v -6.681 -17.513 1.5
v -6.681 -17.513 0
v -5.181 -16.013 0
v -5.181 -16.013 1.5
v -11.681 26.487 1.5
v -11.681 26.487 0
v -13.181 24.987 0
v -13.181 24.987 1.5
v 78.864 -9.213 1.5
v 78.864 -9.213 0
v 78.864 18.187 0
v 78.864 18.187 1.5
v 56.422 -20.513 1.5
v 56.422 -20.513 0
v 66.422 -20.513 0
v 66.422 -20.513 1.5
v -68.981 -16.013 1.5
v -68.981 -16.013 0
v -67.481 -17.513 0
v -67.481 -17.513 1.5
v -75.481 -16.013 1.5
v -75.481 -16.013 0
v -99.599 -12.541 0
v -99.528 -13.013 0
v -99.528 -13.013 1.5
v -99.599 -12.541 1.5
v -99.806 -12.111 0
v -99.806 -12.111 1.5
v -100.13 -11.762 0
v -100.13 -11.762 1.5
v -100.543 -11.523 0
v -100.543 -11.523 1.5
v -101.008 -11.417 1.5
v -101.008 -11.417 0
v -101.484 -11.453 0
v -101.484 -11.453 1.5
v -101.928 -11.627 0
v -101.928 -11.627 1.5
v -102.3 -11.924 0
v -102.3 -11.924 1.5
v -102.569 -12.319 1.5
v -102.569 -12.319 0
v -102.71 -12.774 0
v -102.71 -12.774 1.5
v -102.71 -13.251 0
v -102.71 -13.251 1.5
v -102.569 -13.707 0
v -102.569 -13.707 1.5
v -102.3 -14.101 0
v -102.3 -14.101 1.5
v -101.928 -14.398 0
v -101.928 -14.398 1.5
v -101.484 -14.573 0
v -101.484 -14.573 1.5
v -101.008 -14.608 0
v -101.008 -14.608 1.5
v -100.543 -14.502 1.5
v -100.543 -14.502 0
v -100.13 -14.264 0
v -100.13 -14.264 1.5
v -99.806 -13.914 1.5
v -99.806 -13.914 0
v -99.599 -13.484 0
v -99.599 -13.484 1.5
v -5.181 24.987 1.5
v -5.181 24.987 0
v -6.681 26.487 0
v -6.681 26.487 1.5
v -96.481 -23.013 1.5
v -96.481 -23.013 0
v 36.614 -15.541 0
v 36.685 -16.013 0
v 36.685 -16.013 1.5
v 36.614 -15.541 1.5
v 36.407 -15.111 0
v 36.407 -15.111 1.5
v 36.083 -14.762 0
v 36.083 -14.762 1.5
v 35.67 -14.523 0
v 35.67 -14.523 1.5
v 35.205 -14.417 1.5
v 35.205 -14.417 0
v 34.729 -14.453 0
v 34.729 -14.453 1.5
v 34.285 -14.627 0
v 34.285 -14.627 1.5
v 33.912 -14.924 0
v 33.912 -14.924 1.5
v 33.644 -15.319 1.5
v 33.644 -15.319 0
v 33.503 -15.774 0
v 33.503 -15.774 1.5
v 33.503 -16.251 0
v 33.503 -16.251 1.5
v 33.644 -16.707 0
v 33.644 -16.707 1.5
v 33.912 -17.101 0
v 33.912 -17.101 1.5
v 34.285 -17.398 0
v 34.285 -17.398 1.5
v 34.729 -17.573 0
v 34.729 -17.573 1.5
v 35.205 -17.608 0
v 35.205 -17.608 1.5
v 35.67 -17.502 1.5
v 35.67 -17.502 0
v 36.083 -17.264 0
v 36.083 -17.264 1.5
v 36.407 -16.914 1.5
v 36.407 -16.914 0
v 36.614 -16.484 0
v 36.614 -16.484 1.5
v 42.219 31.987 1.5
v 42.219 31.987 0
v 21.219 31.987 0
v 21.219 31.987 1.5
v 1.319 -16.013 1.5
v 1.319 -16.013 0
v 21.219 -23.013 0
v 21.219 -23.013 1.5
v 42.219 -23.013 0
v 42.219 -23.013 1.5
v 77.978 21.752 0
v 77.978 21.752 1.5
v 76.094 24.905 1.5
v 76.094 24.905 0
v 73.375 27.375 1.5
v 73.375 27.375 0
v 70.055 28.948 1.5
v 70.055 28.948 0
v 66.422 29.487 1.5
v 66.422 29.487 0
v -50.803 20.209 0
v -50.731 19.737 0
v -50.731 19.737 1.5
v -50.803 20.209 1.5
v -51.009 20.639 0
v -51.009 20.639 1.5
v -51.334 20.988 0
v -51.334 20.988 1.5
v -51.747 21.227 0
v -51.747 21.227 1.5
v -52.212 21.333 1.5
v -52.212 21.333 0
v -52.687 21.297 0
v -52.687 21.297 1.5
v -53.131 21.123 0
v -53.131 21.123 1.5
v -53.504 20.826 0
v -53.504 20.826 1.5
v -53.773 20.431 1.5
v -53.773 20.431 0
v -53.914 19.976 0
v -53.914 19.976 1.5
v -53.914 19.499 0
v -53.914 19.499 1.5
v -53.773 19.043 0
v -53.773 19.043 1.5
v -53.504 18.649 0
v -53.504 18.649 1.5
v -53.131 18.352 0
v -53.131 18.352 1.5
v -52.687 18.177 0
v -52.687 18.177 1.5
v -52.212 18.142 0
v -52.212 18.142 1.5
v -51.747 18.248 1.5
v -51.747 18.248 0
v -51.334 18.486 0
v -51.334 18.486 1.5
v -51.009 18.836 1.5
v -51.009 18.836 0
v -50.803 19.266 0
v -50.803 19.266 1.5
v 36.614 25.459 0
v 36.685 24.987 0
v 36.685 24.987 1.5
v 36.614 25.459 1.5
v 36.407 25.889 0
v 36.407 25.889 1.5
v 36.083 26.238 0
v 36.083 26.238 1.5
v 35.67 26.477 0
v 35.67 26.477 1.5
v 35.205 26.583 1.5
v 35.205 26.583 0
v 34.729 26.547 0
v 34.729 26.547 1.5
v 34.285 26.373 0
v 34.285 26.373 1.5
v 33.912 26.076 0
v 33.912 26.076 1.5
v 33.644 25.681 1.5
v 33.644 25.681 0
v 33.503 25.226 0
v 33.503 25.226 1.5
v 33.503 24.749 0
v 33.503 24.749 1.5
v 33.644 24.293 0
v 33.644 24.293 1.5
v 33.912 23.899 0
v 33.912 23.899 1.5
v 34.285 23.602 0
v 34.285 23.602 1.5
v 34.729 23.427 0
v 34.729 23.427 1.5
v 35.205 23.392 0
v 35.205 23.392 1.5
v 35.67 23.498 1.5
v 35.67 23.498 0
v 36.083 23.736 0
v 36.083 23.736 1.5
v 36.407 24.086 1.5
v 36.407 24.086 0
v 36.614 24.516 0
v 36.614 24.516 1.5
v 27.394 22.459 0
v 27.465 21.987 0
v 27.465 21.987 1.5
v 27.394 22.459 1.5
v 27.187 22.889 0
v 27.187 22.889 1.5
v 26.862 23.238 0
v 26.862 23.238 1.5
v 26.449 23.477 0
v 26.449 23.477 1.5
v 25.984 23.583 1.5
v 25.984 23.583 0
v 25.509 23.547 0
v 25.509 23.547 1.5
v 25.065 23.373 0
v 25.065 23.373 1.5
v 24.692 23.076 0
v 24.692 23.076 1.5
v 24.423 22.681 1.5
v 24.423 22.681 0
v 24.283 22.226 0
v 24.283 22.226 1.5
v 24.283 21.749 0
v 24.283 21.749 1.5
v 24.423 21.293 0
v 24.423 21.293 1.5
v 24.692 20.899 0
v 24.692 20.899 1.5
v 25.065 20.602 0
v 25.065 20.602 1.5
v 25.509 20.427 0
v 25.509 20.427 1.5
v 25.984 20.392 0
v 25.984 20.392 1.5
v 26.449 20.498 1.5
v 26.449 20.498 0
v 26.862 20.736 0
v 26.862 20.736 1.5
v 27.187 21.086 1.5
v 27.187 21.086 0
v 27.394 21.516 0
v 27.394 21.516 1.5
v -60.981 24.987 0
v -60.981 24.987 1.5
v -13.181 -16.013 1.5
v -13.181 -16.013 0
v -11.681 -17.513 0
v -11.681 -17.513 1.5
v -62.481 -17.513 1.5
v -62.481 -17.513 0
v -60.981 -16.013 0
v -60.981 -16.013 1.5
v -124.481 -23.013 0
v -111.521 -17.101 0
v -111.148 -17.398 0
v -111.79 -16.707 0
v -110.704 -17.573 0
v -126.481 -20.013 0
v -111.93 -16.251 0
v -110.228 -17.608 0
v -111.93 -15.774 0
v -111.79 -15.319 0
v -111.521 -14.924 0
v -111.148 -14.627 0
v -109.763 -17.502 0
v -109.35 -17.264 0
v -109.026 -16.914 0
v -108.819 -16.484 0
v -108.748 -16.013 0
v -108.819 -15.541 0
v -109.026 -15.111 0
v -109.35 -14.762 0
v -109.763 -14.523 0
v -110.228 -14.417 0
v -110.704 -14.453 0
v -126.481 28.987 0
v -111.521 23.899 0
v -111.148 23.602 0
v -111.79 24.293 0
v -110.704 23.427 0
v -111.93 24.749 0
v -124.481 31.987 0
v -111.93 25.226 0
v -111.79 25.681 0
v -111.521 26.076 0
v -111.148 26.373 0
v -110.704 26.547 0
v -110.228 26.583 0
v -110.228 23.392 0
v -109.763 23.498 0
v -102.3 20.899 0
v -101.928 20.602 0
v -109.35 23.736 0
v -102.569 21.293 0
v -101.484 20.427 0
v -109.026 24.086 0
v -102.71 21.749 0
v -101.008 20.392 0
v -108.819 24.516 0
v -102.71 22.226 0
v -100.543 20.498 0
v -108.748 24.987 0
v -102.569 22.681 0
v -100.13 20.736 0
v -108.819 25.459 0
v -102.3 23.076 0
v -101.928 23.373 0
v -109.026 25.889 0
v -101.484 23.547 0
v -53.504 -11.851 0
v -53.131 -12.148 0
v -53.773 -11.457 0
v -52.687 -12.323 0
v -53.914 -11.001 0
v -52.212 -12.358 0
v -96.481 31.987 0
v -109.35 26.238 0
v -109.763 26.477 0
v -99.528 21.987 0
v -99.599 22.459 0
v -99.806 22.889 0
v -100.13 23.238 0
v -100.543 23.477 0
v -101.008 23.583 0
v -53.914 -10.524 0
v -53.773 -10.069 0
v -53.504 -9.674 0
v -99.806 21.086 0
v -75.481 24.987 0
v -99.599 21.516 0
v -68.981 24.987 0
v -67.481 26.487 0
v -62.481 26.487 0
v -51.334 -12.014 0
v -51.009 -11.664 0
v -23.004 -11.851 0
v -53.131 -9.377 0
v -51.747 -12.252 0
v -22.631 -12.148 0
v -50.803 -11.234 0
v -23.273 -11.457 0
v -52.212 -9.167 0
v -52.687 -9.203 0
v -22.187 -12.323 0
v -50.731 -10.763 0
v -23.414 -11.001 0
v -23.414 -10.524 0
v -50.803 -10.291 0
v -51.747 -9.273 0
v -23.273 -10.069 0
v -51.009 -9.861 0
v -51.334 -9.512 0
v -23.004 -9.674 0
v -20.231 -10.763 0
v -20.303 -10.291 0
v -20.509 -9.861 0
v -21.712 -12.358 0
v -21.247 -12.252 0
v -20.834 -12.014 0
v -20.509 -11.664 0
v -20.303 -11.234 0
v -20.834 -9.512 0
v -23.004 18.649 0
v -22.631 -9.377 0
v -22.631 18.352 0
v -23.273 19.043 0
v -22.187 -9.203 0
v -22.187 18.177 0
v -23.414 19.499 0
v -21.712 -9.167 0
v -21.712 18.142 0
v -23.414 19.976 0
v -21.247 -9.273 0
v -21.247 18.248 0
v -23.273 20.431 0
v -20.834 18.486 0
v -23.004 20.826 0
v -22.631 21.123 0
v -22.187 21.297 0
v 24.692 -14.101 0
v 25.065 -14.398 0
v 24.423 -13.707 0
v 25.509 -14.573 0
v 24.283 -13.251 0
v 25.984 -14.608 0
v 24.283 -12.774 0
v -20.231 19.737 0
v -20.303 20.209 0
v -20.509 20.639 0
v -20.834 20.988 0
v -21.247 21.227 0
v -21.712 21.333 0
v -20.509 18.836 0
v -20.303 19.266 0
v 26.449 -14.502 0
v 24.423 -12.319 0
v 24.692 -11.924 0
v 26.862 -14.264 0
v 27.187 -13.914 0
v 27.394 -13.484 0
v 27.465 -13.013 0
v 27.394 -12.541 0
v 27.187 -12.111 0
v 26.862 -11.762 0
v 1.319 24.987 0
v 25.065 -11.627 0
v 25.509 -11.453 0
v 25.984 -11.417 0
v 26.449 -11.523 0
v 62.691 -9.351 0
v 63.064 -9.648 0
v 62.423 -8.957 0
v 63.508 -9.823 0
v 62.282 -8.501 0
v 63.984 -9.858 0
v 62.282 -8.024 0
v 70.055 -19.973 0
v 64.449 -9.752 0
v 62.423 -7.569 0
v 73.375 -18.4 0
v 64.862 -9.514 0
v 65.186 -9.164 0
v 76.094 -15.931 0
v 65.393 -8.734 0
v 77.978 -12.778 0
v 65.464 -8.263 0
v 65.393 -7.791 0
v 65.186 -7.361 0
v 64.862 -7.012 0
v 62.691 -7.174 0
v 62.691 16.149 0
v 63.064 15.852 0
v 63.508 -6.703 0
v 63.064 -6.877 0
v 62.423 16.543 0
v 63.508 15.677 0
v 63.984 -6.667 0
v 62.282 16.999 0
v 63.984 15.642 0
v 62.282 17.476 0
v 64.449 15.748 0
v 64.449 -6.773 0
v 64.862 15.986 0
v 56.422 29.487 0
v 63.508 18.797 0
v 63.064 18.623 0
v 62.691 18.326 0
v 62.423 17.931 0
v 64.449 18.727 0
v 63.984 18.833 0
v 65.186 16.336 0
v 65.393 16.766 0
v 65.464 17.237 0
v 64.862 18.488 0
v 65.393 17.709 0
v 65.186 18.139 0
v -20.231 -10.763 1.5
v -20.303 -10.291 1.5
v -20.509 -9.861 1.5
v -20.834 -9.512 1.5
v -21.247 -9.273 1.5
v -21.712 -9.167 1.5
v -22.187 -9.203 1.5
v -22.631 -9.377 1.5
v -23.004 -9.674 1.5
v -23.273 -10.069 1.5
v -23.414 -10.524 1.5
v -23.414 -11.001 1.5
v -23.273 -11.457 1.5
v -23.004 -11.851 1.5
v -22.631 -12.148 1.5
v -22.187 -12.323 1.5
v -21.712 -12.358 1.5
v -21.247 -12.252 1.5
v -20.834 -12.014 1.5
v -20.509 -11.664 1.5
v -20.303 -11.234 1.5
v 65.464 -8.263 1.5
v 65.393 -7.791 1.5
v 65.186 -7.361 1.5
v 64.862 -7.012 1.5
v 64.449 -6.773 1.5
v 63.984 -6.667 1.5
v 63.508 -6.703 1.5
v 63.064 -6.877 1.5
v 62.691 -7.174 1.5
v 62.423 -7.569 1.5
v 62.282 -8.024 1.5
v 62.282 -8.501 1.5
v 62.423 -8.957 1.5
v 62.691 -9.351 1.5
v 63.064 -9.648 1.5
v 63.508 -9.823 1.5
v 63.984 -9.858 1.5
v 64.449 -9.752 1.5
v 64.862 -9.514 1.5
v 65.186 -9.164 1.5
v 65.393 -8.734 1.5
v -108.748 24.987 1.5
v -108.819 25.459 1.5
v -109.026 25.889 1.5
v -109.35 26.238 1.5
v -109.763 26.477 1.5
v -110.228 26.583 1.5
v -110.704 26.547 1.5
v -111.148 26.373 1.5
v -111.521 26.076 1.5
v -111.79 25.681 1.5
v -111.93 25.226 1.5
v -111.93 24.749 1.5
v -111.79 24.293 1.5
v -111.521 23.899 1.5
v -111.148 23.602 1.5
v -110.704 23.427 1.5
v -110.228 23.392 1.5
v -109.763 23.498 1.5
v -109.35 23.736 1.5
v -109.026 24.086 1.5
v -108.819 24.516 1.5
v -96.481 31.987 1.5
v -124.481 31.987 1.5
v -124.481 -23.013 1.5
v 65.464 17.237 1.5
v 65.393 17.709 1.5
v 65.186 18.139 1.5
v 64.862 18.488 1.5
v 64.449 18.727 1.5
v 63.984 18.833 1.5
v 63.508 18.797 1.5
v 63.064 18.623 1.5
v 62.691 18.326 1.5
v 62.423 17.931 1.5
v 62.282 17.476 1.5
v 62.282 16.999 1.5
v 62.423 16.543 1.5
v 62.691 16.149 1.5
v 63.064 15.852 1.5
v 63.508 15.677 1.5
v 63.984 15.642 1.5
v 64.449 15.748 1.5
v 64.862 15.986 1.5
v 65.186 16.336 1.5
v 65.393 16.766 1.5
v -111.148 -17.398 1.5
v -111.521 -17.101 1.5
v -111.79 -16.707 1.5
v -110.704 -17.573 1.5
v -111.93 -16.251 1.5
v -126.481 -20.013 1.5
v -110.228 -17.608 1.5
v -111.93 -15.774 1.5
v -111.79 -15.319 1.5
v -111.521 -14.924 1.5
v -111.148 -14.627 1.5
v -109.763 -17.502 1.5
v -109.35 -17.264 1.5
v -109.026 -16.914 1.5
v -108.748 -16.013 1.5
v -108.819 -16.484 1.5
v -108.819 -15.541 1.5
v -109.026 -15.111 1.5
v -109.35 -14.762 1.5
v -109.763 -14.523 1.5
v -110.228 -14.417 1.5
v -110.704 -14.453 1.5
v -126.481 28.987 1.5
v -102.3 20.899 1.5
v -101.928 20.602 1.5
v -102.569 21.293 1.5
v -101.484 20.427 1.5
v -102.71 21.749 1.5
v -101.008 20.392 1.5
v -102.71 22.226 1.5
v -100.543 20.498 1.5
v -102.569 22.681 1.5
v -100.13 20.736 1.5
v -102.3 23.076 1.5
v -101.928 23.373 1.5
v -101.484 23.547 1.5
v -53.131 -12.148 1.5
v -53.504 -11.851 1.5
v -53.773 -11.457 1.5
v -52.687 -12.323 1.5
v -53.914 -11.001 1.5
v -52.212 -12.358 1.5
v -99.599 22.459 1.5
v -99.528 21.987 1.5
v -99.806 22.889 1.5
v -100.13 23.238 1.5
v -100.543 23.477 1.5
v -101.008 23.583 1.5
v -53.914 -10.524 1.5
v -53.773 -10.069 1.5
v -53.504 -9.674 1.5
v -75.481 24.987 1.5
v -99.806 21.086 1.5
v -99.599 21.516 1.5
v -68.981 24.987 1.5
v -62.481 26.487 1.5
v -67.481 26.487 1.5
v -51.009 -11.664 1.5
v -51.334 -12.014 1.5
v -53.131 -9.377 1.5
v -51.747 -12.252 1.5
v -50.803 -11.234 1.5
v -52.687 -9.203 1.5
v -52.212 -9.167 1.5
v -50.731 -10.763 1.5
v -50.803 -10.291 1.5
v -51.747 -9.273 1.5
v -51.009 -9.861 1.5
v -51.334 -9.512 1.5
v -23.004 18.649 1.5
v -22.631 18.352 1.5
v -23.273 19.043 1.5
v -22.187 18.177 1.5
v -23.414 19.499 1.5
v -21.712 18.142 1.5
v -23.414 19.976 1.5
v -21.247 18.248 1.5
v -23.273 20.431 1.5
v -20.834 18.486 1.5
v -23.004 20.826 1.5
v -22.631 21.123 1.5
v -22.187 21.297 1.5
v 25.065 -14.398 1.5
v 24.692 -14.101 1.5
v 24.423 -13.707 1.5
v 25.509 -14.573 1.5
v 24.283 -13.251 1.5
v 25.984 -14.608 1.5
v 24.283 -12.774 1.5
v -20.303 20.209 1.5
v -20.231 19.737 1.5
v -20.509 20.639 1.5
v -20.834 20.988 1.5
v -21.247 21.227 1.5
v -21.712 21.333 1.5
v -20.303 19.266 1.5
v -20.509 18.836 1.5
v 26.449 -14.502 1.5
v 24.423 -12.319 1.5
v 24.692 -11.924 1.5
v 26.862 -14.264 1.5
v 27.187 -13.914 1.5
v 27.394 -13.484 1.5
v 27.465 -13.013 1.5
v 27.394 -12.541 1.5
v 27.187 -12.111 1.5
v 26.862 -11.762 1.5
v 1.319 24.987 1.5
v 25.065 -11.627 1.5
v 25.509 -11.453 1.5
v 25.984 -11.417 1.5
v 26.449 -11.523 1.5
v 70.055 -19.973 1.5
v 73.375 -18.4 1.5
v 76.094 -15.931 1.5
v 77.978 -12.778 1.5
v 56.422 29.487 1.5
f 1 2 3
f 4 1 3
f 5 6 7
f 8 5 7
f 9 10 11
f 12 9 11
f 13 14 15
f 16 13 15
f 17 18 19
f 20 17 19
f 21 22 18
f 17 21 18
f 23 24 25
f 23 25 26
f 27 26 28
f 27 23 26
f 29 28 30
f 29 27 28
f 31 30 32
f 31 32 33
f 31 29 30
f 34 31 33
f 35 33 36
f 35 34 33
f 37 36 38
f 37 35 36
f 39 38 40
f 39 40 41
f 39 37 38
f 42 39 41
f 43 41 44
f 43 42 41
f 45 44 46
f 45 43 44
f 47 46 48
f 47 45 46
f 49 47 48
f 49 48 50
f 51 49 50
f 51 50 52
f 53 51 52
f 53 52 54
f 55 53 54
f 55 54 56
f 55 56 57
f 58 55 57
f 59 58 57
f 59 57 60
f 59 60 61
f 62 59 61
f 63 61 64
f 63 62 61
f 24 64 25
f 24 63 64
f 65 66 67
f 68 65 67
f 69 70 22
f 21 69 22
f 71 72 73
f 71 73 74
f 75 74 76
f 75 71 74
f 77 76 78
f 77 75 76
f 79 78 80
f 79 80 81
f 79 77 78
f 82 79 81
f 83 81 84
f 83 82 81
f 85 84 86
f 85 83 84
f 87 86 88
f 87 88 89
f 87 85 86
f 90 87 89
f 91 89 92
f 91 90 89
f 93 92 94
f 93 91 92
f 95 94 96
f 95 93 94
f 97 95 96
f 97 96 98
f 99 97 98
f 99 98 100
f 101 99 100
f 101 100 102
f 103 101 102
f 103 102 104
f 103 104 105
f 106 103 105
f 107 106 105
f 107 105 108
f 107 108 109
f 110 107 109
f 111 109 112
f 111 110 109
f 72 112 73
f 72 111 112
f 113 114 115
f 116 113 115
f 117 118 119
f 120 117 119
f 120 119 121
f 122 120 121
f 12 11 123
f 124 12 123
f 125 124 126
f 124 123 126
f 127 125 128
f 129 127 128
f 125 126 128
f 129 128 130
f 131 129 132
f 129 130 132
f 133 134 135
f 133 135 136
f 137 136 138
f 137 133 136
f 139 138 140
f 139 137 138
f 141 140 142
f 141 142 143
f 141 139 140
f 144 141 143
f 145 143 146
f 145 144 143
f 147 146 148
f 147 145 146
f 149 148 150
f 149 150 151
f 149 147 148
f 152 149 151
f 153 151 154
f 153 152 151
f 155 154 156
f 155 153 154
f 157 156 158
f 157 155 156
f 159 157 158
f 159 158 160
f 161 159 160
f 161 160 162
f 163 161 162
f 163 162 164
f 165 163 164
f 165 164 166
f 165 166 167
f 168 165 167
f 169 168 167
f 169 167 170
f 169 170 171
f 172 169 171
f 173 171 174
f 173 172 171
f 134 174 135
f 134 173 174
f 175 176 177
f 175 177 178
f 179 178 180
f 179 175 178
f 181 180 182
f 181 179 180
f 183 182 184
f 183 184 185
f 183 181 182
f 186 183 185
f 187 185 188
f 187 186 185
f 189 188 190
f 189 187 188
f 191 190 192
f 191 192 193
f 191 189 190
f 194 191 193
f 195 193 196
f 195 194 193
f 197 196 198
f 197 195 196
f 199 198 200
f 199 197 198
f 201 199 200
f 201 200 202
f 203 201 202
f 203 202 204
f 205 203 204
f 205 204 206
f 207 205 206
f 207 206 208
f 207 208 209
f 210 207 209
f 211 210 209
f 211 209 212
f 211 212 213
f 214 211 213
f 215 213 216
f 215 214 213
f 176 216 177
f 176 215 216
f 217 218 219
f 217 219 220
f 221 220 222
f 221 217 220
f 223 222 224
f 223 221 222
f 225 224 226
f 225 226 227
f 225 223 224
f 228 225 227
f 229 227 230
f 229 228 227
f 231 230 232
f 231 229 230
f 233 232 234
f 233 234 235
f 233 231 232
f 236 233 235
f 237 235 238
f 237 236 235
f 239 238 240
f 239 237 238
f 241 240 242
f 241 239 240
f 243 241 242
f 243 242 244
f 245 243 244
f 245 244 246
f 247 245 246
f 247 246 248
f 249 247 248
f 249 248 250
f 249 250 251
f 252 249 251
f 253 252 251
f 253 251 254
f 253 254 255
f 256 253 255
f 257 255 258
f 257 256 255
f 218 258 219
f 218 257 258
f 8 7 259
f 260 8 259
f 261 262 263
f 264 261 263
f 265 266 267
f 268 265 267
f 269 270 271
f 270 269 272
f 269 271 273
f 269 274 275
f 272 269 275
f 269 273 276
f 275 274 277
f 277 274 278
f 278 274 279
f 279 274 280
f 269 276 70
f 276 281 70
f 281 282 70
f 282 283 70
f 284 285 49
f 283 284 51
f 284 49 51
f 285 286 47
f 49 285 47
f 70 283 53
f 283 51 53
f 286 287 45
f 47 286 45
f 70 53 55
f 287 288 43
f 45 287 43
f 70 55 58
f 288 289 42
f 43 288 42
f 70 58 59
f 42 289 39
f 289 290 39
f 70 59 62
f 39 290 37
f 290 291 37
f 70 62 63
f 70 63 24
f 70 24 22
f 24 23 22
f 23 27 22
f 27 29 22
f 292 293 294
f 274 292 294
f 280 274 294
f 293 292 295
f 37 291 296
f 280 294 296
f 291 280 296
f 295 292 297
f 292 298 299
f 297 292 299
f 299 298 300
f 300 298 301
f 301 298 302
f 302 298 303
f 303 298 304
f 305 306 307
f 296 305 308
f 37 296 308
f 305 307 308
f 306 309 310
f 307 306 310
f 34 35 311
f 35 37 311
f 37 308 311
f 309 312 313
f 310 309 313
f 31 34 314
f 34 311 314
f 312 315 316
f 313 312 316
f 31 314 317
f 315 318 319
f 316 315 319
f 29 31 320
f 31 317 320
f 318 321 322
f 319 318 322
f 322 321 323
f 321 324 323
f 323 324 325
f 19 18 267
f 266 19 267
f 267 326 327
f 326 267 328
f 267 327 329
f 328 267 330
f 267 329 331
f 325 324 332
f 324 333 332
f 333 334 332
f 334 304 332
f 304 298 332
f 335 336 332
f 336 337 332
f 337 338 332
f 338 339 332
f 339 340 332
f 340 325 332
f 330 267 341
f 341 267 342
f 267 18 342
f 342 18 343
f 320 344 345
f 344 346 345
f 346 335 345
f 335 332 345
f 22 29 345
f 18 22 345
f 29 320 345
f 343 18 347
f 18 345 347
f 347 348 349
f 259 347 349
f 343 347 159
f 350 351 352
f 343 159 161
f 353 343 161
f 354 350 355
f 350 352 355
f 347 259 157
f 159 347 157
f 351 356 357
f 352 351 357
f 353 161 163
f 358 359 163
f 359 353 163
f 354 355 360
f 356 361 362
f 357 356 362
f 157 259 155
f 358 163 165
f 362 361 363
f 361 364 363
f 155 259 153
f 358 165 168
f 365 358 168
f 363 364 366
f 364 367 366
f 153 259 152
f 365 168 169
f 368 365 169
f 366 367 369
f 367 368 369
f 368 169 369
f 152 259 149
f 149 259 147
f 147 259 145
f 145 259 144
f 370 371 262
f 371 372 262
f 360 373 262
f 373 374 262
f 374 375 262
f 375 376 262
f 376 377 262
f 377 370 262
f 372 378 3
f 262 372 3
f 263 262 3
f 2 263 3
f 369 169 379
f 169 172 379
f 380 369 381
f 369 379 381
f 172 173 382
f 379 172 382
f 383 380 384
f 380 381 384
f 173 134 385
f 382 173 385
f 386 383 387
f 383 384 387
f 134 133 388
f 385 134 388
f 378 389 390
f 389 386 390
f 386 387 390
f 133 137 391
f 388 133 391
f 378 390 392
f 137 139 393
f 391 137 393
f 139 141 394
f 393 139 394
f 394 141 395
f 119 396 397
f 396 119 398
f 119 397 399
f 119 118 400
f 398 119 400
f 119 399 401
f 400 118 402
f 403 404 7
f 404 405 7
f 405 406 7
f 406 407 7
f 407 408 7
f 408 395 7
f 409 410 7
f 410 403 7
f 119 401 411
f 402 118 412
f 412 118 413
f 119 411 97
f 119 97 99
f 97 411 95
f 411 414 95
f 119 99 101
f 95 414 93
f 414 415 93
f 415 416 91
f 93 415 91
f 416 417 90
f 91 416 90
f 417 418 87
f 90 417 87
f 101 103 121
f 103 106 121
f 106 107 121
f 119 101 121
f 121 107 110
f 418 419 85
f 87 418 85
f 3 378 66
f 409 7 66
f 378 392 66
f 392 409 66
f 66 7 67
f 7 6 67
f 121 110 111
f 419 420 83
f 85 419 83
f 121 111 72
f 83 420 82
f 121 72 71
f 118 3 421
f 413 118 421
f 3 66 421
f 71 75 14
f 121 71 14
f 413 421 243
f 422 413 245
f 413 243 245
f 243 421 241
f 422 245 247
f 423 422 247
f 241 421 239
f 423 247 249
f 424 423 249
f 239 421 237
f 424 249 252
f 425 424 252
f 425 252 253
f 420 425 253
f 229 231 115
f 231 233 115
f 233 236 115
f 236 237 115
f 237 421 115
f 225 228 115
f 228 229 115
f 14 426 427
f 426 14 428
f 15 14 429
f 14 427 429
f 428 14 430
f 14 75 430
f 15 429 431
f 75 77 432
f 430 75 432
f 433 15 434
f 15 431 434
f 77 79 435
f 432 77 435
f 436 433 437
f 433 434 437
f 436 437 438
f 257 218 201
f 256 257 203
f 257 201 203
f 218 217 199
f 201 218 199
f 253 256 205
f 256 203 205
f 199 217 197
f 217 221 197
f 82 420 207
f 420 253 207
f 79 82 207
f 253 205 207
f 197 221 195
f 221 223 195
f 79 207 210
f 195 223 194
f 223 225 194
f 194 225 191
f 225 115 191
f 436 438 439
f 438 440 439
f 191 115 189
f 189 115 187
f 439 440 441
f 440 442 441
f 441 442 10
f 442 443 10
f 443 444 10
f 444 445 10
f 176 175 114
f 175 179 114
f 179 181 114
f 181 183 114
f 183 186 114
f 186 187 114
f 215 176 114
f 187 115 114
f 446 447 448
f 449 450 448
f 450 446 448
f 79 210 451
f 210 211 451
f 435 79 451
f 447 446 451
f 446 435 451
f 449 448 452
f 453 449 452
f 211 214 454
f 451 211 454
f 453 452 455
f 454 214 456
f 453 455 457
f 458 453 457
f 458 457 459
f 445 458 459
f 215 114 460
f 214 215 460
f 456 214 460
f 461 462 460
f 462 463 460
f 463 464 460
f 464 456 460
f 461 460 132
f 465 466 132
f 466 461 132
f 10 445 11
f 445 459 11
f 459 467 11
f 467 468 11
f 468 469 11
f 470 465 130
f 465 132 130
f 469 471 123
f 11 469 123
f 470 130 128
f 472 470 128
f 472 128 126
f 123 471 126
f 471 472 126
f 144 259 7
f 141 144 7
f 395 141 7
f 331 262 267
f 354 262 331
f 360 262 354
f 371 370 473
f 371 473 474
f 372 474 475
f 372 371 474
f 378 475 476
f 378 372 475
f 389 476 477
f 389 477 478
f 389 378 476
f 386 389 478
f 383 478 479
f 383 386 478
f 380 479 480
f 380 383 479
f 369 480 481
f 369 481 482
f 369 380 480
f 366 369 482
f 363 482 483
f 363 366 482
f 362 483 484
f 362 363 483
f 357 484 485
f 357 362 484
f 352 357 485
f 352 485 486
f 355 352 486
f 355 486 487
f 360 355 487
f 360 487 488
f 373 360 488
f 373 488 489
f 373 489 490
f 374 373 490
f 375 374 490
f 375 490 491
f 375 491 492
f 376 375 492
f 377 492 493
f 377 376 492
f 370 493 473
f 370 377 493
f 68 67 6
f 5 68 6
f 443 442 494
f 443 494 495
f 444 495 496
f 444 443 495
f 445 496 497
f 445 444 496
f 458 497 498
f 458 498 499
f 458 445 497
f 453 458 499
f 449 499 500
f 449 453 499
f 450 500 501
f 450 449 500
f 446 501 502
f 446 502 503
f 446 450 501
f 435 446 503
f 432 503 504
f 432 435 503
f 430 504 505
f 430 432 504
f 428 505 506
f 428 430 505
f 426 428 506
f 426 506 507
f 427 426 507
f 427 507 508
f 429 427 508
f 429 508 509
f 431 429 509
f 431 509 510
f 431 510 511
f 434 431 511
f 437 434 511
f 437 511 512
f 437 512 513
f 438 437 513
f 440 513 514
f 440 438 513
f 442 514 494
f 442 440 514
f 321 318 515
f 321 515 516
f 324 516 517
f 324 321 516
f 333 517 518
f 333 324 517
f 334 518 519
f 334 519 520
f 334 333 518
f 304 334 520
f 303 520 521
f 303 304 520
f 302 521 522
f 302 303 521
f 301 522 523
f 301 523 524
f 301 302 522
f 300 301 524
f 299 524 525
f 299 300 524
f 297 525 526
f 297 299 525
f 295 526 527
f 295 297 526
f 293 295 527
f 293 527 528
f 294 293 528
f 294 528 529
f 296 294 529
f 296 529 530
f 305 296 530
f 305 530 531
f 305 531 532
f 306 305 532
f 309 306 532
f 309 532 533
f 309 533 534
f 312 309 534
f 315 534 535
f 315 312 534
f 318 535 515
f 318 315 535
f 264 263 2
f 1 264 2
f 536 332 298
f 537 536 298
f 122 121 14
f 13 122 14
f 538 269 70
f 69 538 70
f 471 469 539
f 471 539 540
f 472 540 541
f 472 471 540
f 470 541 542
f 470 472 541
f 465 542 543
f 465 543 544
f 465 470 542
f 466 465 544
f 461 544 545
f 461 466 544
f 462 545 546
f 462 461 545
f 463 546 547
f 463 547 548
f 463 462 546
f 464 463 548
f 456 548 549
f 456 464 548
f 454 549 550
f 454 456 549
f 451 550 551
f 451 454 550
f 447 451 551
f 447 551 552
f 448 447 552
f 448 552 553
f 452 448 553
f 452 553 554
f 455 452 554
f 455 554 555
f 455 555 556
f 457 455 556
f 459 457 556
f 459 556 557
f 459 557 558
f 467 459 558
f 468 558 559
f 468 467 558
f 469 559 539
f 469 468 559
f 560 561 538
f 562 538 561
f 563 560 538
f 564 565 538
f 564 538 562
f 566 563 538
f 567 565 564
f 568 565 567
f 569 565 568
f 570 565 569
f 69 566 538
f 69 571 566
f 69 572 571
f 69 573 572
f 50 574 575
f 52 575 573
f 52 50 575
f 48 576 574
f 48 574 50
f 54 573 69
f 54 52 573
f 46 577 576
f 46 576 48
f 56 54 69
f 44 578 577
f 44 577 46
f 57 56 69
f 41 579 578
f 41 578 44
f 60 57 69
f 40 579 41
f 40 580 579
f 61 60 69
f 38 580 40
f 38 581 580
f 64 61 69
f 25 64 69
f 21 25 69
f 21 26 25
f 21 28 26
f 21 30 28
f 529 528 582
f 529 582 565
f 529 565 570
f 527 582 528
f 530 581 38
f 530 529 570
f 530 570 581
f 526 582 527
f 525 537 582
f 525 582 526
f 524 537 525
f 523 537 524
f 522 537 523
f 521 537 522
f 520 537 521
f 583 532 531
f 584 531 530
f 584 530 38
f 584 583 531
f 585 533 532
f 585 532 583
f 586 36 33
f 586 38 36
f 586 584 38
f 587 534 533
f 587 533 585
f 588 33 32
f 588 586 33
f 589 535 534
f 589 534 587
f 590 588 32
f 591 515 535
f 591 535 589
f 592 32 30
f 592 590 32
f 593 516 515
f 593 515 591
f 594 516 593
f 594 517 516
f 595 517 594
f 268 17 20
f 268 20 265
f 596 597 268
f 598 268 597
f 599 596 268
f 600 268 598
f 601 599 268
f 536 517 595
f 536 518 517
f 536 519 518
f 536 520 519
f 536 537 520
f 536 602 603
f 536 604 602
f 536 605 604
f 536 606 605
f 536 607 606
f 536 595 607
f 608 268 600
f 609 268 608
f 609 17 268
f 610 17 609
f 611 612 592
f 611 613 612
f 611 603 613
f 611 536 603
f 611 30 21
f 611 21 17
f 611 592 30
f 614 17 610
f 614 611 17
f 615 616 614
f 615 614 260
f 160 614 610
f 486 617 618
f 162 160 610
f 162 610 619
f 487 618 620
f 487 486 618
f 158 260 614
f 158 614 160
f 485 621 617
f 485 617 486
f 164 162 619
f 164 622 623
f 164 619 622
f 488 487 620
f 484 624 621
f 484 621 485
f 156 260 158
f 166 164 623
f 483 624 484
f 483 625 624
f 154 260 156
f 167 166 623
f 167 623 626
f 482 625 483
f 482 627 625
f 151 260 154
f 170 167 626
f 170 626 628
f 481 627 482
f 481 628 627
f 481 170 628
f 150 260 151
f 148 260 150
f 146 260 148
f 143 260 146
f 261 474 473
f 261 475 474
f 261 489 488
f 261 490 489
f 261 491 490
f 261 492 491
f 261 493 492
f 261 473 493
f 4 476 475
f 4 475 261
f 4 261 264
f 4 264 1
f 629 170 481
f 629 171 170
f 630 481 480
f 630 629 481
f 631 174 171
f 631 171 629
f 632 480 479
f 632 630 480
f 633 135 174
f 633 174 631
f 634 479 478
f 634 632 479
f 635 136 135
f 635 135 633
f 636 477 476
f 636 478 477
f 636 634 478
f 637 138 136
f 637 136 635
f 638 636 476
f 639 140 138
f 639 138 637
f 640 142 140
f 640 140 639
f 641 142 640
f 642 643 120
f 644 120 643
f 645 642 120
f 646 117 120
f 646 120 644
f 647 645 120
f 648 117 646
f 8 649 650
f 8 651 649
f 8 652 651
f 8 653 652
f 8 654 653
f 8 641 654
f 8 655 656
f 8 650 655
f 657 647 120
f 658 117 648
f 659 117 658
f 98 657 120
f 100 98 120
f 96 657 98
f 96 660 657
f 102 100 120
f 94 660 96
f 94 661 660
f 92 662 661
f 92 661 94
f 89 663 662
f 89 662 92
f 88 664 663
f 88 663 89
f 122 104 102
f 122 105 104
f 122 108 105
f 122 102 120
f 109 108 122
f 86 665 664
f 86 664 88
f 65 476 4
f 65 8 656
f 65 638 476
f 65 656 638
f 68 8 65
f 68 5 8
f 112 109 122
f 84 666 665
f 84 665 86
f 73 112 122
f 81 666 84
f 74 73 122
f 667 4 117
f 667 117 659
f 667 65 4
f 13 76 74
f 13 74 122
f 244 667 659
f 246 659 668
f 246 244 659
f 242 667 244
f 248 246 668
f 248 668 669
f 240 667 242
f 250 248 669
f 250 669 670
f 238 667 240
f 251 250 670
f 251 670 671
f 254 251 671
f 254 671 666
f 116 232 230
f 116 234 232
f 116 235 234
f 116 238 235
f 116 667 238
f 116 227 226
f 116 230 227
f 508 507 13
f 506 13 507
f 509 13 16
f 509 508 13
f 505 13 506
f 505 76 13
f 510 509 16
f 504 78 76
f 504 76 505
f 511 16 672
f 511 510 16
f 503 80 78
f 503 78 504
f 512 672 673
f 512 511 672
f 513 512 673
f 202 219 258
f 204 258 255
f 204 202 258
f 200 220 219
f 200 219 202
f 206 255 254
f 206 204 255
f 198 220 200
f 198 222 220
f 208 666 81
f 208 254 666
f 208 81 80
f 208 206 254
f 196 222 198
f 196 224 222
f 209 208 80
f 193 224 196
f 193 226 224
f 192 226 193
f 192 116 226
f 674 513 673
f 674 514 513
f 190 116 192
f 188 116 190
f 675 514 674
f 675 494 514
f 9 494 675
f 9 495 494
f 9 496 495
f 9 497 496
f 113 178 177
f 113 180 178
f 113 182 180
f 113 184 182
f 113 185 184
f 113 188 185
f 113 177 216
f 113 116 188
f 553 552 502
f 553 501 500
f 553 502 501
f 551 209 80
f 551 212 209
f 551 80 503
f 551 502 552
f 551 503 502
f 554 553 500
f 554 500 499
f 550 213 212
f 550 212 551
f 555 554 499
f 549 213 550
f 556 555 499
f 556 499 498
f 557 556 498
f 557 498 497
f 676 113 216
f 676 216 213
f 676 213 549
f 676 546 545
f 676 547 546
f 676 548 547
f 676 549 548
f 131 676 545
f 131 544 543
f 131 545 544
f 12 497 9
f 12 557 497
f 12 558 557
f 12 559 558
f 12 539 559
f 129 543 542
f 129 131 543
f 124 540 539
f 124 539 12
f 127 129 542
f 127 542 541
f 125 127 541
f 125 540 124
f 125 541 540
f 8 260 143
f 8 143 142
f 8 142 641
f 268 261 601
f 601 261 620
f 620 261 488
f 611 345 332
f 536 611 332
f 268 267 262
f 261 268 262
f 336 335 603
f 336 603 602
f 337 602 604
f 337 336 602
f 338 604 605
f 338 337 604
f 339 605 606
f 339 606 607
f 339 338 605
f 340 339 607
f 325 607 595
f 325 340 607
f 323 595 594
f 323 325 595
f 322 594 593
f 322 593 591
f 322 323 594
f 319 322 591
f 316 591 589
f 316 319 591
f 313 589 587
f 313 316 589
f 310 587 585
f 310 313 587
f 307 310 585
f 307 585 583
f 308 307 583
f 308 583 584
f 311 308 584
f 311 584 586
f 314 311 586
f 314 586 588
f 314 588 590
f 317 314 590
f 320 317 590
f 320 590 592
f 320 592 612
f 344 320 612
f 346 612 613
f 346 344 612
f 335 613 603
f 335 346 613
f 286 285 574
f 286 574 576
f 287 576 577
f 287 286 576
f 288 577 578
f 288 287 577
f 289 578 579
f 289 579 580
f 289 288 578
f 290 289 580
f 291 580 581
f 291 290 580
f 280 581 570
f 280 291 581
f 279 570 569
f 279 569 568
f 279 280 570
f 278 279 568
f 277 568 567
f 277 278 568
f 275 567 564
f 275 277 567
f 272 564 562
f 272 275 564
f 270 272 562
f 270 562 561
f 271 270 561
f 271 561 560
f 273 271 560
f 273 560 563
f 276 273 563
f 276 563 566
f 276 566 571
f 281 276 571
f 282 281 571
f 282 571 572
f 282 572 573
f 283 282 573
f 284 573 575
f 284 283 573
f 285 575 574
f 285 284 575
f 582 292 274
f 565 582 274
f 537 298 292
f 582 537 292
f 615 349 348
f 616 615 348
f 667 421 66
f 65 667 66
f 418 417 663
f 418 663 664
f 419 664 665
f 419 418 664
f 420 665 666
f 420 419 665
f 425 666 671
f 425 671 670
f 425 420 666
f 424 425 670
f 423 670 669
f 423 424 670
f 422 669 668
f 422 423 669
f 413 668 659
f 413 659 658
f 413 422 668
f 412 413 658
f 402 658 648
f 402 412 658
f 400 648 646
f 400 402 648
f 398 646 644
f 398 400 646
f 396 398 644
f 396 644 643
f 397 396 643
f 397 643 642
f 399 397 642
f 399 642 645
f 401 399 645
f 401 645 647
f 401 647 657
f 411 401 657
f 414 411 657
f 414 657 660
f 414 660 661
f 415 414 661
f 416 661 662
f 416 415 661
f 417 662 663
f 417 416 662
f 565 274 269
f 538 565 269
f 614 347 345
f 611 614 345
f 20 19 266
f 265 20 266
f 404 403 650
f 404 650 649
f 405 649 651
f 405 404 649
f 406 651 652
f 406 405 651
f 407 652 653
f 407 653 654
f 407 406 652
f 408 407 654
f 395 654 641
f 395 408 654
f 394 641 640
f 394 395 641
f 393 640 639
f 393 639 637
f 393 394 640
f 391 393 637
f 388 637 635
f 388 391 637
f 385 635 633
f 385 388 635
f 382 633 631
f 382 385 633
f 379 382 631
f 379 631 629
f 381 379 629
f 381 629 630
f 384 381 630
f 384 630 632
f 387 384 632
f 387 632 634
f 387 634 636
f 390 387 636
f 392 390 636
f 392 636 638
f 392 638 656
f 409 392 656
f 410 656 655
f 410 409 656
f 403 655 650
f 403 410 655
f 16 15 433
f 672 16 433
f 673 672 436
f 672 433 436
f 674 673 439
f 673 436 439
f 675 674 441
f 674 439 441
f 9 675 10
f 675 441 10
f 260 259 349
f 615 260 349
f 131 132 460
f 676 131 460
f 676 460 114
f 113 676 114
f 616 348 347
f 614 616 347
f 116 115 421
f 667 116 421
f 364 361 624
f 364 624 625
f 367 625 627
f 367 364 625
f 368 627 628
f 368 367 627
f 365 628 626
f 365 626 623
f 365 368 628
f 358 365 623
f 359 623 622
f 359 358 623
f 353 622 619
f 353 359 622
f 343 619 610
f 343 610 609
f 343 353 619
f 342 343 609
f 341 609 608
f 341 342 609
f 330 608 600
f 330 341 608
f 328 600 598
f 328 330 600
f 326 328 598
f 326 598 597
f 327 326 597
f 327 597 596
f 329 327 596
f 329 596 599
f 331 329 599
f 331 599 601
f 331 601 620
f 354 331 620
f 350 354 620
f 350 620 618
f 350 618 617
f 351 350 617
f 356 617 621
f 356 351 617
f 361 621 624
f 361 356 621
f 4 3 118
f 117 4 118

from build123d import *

# Parameters (mm, degrees)
F0_R     = 1.6
F1_DEPTH = 1.5


# Not quite as in the source:
# - ends of sketch curves that miss each other by under 0.0002 mm in the source are joined


with BuildPart() as f1:
    # F0 (on Top) → F1 (new body)
    with BuildSketch(Plane.XY):
        with BuildLine():
            Line((-9.1814305153, -17.5127292487), (-6.6814305153, -17.5127292487))
            Line((-6.6814305153, -17.5127292487), (-5.1814305153, -16.0127292487))
            Line((-5.1814305153, -16.0127292487), (1.3185694847, -16.0127292487))
            Line((1.3185694847, -16.0127292487), (21.2185694847, -23.0127292487))
            Line((21.2185694847, -23.0127292487), (42.2185694847, -23.0127292487))
            Line((42.2185694847, -23.0127292487), (56.4220884847, -20.5127292487))
            Line((56.4220884847, -20.5127292487), (66.4220884847, -20.5127292487))
            ThreePointArc((66.4220884847, -20.5127292487), (74.8259566177, -17.2661070322), (78.864355153, -9.2127293132))
            Line((78.864355153, -9.2127293132), (78.8643544847, 18.1872707513))
            ThreePointArc((78.8643544847, 18.1872707513), (74.8259566177, 26.2406485347), (66.4220884847, 29.4872707513))
            Line((66.4220884847, 29.4872707513), (56.4220884847, 29.4872707513))
            Line((56.4220884847, 29.4872707513), (42.2185694847, 31.9872707513))
            Line((42.2185694847, 31.9872707513), (21.2185694847, 31.9872707513))
            Line((21.2185694847, 31.9872707513), (1.3185694847, 24.9872707513))
            Line((1.3185694847, 24.9872707513), (-5.1814305153, 24.9872707513))
            Line((-5.1814305153, 24.9872707513), (-6.6814305153, 26.4872707513))
            Line((-6.6814305153, 26.4872707513), (-9.1814305153, 26.4872707513))
            Line((-9.1814305153, 26.4872707513), (-11.6814305153, 26.4872707513))
            Line((-11.6814305153, 26.4872707513), (-13.1814305153, 24.9872707513))
            Line((-13.1814305153, 24.9872707513), (-60.9814305153, 24.9872707513))
            Line((-60.9814305153, 24.9872707513), (-62.4814305153, 26.4872707513))
            Line((-62.4814305153, 26.4872707513), (-64.9814305153, 26.4872707513))
            Line((-64.9814305153, 26.4872707513), (-67.4814305153, 26.4872707513))
            Line((-67.4814305153, 26.4872707513), (-68.9814305153, 24.9872707513))
            Line((-68.9814305153, 24.9872707513), (-75.4814305153, 24.9872707513))
            Line((-75.4814305153, 24.9872707513), (-96.4814305153, 31.9872707513))
            Line((-96.4814305153, 31.9872707513), (-116.4814305153, 31.9872707513))
            Line((-116.4814305153, 31.9872707513), (-124.4814305153, 31.9872707513))
            Line((-124.4814305153, 31.9872707513), (-126.4814305153, 28.9872707513))
            Line((-126.4814305153, 28.9872707513), (-126.4814305153, -20.0127292487))
            Line((-126.4814305153, -20.0127292487), (-124.4814305153, -23.0127292487))
            Line((-124.4814305153, -23.0127292487), (-116.4814305153, -23.0127292487))
            Line((-116.4814305153, -23.0127292487), (-96.4814305153, -23.0127292487))
            Line((-96.4814305153, -23.0127292487), (-75.4814305153, -16.0127292487))
            Line((-75.4814305153, -16.0127292487), (-68.9814305153, -16.0127292487))
            Line((-68.9814305153, -16.0127292487), (-67.4814305153, -17.5127292487))
            Line((-67.4814305153, -17.5127292487), (-64.9814305153, -17.5127292487))
            Line((-64.9814305153, -17.5127292487), (-62.4814305153, -17.5127292487))
            Line((-62.4814305153, -17.5127292487), (-60.9814305153, -16.0127292487))
            Line((-60.9814305153, -16.0127292487), (-13.1814305153, -16.0127292487))
            Line((-13.1814305153, -16.0127292487), (-11.6814305153, -17.5127292487))
            Line((-11.6814305153, -17.5127292487), (-9.1814305153, -17.5127292487))
        make_face()
        with Locations((-110.3480007641, -16.0127292487)):
            Circle(F0_R, mode=Mode.SUBTRACT)
        with Locations((-101.1275529865, -13.0127292487)):
            Circle(F0_R, mode=Mode.SUBTRACT)
        with Locations((-52.3314305153, -10.7627292487)):
            Circle(F0_R, mode=Mode.SUBTRACT)
        with Locations((-21.8314305153, -10.7627292487)):
            Circle(F0_R, mode=Mode.SUBTRACT)
        with Locations((25.8646919559, -13.0127292487)):
            Circle(F0_R, mode=Mode.SUBTRACT)
        with Locations((35.0851397335, -16.0127292487)):
            Circle(F0_R, mode=Mode.SUBTRACT)
        with Locations((63.8643544847, -8.2627292487)):
            Circle(F0_R, mode=Mode.SUBTRACT)
        with Locations((-101.1275529865, 21.9872707513)):
            Circle(F0_R, mode=Mode.SUBTRACT)
        with Locations((-110.3480007641, 24.9872707513)):
            Circle(F0_R, mode=Mode.SUBTRACT)
        with Locations((-52.3314305153, 19.7372707513)):
            Circle(F0_R, mode=Mode.SUBTRACT)
        with Locations((63.8643544847, 17.2372707513)):
            Circle(F0_R, mode=Mode.SUBTRACT)
        with Locations((-21.8314305153, 19.7372707513)):
            Circle(F0_R, mode=Mode.SUBTRACT)
        with Locations((25.8646919559, 21.9872707513)):
            Circle(F0_R, mode=Mode.SUBTRACT)
        with Locations((35.0851397335, 24.9872707513)):
            Circle(F0_R, mode=Mode.SUBTRACT)
    extrude(amount=F1_DEPTH)


solid = f1.part
